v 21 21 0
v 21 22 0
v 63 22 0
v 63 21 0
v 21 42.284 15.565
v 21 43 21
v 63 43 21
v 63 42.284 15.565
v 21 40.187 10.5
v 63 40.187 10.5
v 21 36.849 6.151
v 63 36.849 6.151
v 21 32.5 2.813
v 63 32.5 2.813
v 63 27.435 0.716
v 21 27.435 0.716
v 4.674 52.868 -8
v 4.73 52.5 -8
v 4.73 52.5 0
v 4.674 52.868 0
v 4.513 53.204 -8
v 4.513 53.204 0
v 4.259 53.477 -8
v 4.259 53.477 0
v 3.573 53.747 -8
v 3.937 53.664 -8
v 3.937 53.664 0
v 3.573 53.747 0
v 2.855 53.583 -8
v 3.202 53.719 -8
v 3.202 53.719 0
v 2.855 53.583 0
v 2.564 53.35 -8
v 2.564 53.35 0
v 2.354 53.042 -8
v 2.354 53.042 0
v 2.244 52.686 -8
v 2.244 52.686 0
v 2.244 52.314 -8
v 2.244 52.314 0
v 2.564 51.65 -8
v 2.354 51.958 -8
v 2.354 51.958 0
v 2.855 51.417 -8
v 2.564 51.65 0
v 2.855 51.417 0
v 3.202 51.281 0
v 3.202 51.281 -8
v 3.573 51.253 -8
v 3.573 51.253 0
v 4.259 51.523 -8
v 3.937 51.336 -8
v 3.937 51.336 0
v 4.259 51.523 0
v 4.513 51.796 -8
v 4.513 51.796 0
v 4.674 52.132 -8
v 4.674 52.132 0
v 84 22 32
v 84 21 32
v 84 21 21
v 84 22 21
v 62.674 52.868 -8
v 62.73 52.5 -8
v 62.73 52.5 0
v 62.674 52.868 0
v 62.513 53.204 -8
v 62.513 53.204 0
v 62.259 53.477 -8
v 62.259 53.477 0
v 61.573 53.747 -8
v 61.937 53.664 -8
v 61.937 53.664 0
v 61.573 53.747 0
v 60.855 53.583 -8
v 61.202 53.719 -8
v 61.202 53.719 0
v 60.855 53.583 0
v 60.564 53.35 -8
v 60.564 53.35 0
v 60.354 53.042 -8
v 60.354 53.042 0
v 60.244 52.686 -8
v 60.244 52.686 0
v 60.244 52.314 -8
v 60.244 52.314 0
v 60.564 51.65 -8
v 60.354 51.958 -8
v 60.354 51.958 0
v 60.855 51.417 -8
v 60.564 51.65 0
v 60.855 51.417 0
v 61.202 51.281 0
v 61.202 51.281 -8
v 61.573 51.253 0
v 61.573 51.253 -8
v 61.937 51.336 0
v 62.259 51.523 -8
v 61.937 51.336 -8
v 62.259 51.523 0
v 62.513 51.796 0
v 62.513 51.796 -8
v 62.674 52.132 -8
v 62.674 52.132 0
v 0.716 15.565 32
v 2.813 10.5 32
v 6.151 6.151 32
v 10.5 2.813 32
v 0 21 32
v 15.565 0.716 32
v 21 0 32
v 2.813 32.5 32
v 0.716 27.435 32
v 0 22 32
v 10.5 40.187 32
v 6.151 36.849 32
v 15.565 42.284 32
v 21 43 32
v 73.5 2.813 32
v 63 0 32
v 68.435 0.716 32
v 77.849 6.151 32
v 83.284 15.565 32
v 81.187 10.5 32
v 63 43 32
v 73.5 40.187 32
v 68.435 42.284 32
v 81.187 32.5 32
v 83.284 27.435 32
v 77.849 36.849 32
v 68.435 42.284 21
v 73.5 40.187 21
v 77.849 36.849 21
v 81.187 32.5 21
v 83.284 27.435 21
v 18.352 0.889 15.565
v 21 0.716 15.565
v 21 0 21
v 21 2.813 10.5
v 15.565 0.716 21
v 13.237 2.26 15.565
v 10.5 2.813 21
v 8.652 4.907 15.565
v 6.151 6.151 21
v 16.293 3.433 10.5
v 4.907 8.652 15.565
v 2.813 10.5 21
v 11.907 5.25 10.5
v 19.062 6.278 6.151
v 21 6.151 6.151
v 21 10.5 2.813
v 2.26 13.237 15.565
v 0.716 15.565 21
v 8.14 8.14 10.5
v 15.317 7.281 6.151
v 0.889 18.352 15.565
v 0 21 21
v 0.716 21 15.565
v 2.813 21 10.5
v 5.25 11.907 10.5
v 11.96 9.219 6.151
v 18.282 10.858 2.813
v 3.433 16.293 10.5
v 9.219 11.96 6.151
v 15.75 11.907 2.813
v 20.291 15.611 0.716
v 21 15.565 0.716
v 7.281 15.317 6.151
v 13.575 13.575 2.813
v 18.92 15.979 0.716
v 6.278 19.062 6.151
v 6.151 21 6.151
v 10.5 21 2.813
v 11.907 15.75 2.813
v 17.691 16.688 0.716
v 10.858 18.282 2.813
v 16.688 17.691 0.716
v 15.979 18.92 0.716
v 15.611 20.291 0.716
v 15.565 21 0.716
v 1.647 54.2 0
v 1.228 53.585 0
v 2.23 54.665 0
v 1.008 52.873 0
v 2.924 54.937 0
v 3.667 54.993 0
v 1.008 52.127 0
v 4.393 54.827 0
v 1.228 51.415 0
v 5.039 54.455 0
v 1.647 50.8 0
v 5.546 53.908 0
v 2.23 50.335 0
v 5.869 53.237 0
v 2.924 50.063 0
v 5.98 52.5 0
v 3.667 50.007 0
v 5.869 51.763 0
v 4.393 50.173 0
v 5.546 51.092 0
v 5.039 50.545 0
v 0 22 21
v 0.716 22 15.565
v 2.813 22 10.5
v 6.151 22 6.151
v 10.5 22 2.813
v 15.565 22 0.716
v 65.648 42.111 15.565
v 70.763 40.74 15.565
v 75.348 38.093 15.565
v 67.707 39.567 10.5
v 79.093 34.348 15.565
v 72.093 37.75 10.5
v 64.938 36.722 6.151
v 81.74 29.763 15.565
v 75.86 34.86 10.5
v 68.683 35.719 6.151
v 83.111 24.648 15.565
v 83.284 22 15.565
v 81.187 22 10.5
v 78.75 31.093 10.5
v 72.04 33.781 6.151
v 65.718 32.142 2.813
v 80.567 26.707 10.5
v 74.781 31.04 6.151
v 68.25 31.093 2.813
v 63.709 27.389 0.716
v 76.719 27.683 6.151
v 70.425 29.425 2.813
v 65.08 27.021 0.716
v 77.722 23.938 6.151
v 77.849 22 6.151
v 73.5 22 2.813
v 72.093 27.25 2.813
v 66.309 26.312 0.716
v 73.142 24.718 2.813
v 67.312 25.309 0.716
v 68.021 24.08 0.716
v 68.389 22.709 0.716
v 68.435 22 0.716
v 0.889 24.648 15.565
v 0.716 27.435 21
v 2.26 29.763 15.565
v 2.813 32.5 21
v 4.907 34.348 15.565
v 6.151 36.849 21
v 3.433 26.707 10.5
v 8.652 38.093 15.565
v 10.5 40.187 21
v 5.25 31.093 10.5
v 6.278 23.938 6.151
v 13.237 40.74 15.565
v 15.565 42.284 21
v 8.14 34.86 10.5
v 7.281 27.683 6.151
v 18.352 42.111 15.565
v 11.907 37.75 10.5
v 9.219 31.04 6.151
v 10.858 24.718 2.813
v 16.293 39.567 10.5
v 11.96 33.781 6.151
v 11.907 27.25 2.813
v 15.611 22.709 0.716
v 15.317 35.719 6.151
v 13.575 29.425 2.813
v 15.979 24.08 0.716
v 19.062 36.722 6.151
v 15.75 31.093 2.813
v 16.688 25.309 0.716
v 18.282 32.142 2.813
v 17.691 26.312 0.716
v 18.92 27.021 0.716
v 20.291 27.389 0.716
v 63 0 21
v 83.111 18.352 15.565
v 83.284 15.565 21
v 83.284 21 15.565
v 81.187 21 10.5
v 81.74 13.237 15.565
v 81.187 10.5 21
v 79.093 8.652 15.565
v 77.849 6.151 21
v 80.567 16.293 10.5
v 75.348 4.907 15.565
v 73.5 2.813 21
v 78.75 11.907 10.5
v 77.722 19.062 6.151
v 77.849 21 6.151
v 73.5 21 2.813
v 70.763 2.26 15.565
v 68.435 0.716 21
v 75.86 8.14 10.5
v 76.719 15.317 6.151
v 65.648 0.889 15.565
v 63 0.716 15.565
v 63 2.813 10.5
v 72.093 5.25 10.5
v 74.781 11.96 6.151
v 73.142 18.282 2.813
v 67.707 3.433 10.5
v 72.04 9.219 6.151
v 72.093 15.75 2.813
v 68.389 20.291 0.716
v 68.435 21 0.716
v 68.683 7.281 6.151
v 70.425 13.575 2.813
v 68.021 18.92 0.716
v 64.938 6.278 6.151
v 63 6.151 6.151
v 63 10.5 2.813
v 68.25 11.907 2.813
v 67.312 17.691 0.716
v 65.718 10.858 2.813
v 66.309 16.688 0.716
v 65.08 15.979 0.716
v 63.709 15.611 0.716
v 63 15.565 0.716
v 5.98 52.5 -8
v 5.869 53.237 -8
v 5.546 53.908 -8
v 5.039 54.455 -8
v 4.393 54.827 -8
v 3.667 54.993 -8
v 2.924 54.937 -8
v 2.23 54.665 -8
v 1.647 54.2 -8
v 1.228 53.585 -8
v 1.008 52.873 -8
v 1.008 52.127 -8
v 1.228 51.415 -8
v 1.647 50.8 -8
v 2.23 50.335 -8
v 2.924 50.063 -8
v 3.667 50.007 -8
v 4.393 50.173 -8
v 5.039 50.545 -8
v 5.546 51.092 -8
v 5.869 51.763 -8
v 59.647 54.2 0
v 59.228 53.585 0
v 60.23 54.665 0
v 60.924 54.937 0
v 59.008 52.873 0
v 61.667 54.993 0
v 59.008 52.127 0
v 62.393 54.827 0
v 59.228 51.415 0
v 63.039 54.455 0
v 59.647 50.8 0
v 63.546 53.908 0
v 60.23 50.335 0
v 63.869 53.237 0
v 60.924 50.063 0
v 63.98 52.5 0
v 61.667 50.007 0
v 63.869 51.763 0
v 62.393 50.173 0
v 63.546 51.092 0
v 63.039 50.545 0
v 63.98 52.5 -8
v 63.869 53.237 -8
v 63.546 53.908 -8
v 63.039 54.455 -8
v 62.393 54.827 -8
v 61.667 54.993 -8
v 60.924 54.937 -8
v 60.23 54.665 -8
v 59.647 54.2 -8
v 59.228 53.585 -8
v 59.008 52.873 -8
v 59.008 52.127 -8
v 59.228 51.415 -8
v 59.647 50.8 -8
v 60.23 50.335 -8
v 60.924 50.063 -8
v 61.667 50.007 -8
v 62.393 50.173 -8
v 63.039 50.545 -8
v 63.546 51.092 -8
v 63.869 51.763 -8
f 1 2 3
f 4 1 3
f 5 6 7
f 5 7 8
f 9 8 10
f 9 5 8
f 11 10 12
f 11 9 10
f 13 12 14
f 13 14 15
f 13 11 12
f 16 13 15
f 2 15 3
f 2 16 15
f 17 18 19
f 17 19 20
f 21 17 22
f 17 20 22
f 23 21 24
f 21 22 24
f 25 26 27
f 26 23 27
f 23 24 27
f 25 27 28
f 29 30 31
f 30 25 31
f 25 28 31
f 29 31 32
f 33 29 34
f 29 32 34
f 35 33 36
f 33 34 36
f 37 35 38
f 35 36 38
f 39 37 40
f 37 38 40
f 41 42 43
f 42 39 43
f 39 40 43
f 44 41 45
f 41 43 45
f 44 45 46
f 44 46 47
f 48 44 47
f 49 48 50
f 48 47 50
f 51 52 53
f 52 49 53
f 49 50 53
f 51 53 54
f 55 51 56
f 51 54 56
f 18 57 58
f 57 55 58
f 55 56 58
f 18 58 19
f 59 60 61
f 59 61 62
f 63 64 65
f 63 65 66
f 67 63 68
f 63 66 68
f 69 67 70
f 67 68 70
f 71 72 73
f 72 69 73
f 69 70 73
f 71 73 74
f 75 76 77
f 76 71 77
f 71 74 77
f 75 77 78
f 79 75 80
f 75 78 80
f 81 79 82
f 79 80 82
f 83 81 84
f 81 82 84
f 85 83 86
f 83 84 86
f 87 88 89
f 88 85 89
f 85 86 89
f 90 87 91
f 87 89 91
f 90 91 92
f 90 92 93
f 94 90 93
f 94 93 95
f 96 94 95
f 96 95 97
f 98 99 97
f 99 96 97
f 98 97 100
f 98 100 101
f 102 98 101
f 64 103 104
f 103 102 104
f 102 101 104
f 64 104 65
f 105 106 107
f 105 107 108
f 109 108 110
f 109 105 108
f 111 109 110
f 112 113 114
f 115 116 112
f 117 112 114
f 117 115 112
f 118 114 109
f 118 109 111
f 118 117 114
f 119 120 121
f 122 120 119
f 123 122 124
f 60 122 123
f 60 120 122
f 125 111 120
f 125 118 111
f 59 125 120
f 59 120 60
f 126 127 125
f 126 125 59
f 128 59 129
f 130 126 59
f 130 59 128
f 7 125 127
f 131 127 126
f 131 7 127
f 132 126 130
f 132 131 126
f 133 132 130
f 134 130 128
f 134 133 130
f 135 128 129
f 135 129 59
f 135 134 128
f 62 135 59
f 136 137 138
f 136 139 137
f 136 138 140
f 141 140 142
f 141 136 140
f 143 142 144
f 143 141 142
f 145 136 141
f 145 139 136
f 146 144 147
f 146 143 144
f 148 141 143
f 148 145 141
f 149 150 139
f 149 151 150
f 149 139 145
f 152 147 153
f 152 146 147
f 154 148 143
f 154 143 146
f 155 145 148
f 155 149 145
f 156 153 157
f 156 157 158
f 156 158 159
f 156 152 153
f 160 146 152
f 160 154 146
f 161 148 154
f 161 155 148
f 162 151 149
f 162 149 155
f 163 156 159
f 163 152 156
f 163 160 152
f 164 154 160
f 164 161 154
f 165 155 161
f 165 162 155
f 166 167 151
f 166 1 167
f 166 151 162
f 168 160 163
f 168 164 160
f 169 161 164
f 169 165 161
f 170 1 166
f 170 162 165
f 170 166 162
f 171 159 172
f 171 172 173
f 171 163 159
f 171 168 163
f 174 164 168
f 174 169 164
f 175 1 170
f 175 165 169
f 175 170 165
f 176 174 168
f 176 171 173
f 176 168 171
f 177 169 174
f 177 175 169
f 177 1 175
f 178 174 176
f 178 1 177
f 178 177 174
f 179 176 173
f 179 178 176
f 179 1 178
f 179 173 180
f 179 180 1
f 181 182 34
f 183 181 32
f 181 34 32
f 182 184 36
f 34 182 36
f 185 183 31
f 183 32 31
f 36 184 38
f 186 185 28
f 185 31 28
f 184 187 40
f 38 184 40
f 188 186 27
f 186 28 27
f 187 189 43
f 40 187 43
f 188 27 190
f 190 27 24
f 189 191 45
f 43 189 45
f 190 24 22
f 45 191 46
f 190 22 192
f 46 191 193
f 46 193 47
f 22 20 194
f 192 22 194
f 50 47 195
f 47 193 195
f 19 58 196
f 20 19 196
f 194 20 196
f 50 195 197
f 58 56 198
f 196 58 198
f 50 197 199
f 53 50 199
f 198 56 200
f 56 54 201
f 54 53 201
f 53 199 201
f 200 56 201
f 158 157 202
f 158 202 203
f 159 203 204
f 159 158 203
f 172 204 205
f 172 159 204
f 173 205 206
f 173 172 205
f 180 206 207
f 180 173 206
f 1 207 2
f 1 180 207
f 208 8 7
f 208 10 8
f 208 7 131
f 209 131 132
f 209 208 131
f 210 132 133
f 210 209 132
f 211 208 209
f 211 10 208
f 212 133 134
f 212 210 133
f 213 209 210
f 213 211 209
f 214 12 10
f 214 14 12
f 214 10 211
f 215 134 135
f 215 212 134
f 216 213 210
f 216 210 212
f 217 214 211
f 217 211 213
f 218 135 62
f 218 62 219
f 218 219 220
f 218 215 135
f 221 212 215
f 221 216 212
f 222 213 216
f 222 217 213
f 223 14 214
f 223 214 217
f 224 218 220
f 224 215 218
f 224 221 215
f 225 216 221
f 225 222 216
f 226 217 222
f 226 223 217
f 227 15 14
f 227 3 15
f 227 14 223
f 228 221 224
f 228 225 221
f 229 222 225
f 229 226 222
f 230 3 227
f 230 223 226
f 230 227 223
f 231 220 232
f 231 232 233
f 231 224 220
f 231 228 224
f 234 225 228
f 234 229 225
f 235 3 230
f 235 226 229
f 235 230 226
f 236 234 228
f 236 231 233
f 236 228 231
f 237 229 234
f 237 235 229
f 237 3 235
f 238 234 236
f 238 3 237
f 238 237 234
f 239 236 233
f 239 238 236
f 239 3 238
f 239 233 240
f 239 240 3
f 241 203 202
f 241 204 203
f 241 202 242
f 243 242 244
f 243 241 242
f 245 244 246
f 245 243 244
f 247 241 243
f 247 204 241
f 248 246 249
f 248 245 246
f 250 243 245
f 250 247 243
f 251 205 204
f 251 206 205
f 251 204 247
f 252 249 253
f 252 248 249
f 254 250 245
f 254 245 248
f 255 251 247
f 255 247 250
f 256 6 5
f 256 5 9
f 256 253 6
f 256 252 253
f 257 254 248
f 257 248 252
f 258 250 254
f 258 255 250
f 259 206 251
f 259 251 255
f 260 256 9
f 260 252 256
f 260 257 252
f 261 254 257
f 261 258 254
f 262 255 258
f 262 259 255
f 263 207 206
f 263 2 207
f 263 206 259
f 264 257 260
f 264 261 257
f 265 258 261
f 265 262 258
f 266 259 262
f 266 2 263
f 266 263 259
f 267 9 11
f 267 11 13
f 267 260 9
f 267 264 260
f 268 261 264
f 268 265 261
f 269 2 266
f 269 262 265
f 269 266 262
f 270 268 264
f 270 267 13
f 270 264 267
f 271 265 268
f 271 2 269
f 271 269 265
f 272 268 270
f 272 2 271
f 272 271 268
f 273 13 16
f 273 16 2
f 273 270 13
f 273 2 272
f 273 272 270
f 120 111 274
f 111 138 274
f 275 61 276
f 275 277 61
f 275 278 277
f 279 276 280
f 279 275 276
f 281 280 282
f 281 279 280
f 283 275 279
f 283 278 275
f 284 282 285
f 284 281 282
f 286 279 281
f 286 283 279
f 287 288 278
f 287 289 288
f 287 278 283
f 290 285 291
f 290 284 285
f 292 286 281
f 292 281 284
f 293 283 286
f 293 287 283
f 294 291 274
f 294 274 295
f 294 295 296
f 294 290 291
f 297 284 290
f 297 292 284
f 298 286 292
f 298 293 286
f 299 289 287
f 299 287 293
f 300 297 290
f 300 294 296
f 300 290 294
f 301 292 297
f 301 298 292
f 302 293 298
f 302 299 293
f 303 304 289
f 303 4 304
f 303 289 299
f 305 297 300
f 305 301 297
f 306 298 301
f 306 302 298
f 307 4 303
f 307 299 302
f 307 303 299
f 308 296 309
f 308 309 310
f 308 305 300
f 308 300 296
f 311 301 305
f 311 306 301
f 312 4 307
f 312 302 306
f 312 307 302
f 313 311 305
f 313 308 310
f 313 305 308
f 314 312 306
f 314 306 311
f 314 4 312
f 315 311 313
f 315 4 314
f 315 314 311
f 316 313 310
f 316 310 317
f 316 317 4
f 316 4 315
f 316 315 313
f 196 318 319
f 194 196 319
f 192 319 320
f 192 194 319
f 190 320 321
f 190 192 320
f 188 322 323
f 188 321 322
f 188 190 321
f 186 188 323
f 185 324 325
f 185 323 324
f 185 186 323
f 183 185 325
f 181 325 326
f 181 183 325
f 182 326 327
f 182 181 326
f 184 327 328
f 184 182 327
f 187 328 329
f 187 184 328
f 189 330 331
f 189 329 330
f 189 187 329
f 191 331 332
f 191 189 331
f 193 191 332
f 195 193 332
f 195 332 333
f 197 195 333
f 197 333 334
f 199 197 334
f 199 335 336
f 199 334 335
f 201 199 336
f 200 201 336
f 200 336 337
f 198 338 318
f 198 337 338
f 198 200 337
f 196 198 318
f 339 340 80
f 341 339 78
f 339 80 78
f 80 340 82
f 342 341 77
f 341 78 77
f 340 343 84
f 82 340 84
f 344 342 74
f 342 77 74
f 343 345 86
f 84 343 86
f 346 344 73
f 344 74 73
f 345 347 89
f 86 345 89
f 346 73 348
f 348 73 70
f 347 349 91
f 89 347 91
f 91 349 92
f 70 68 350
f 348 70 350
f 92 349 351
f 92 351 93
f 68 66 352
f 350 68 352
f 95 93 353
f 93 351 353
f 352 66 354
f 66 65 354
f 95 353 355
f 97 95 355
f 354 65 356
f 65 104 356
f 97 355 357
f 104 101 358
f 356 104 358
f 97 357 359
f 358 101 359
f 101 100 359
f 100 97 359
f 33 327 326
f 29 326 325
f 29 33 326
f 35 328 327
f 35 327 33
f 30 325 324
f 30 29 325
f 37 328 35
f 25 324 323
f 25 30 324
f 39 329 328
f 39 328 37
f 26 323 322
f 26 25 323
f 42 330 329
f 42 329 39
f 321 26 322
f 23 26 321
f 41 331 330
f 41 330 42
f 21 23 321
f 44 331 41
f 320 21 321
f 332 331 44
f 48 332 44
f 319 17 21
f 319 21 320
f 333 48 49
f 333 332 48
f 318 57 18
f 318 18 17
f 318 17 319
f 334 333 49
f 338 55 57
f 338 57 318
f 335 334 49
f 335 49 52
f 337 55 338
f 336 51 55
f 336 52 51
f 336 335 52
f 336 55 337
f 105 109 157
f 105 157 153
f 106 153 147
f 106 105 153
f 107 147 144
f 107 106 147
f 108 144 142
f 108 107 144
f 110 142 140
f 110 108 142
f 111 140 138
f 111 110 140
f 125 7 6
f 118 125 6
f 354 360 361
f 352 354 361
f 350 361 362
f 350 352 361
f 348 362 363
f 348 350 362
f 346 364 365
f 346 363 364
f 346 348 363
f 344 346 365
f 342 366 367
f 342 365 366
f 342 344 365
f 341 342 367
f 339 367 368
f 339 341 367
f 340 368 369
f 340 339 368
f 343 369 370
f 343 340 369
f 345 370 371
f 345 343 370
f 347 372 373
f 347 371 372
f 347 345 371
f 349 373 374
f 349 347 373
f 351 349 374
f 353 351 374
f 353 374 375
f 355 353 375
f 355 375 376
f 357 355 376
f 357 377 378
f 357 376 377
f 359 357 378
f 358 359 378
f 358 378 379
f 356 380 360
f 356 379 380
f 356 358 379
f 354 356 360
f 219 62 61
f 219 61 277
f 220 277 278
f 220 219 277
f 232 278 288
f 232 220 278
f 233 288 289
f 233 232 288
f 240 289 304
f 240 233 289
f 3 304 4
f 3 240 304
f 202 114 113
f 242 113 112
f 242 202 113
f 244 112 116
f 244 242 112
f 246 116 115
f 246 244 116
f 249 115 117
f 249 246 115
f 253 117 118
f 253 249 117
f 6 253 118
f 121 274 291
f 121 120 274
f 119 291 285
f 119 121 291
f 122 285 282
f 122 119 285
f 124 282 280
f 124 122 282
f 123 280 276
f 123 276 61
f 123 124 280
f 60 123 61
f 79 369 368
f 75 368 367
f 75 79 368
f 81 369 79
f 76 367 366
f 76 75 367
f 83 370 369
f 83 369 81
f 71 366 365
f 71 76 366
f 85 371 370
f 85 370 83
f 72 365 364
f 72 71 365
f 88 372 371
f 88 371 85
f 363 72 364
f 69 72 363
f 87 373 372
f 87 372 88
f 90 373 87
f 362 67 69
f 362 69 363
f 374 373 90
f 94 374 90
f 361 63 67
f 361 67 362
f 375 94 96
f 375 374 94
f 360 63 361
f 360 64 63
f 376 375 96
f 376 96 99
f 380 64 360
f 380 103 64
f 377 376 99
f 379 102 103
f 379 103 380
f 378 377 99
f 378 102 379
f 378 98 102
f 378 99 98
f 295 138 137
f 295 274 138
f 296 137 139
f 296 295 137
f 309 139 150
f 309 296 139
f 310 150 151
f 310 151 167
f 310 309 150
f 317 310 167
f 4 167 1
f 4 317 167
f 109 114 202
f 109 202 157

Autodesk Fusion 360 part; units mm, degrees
sketch "Sketch1" plane through (0, 0, 0) normal (0, 0, 1) x (1, 0, 0)
  line L0 (0, 0) -> (85, 0)
  line L1 (85, 0) -> (85, 56)
  line L2 (85, 56) -> (0, 56)
  line L3 (0, 56) -> (0, 0)
  dimension "d1" = 85
  dimension "d2" = 56
extrude "Extrude1" add sketch "Sketch1" along normal blind 6
sketch "Sketch2" plane through (0, 0, 6) normal (0, 0, 1) x (-1, 0, 0)
  line L0 (0, -56) -> (0, 0)
  line L1 (0, 0) -> (-85, 0)
  line L2 (-85, 0) -> (-85, -56)
  line L3 (-85, -56) -> (0, -56)
  line L4 (-85, 0) -> (-85, -3)
  line L5 (-85, -3) -> (-82.59, -3)
  line L6 (-82.59, -3) -> (-8.55, -3)
  line L7 (-8.55, -3) -> (-8.55, -52.56)
  line L8 (-8.55, -52.56) -> (-82.59, -52.56)
  line L9 (-82.59, -52.56) -> (-82.59, -3)
  dimension "d5" = 3
  dimension "d6" = 2.41
  dimension "d7" = 74.04
  dimension "d8" = 49.56
extrude "Extrude2" cut sketch "Sketch2" against normal blind 0.1 contours L6 L7 L8 L9
sketch "Sketch3" plane through (0, 0, 0) normal (0, 0, -1) x (1, 0, 0)
  line L0 (0, 0) -> (0, -56)
  line L1 (0, -56) -> (85, -56)
  line L2 (85, -56) -> (85, 0)
  line L3 (85, 0) -> (0, 0)
  line L4 (0, 0) -> (0, -56)
  circle A0 centre (3.48, -3.5) radius 1.25
  circle A1 centre (3.48, -52.5) radius 1.25
  circle A2 centre (3.48, -52.5) radius 2.5
  circle A3 centre (3.48, -3.5) radius 2.5
  circle A4 centre (61.48, -52.5) radius 1.25
  circle A5 centre (61.48, -3.5) radius 1.25
  circle A6 centre (61.48, -3.5) radius 2.5
  circle A7 centre (61.48, -52.5) radius 2.5
  dimension "d14" = 2.5
  dimension "d15" = 2.5
  dimension "d16" = 5
  dimension "d17" = 5
  dimension "d18" = 58
  dimension "d20" = 2.5
  dimension "d21" = 2.5
  dimension "d22" = 5
  dimension "d23" = 5
extrude "Extrude3" add sketch "Sketch3" along normal blind 8 contours A2 | A3 | A6 | A7

Autodesk Fusion 360 part; units mm, degrees
sketch "Sketch1" plane through (0, 0, 0) normal (0, 0, 1) x (1, 0, 0)
  line L0 (0, 0) -> (84, 0)
  line L1 (84, 0) -> (84, 43)
  line L2 (84, 43) -> (0, 43)
  line L3 (0, 43) -> (0, 0)
  dimension "d4" = 84
  dimension "d5" = 43
extrude "Extrude1" add sketch "Sketch1" along normal blind 32
fillet "Fillet1" radius 21 4 edges at (0, 0, 16) (0, 43, 16) (84, 43, 16) (84, 0, 16)
fillet "Fillet2" radius 21 8 edges at (0, 21.5, 0) (6.1508, 6.1508, 0) (42, 0, 0) (77.8492, 6.1508, 0) (84, 21.5, 0) (77.8492, 36.8492, 0) (42, 43, 0) (6.1508, 36.8492, 0)
equation "LSpeaker = 84 mm"
equation "WSpeaker = 43 mm"
equation "DSpeaker = 32 mm"
equation "d4 = LSpeaker"
equation "d5 = WSpeaker"
equation "d6 = DSpeaker"
